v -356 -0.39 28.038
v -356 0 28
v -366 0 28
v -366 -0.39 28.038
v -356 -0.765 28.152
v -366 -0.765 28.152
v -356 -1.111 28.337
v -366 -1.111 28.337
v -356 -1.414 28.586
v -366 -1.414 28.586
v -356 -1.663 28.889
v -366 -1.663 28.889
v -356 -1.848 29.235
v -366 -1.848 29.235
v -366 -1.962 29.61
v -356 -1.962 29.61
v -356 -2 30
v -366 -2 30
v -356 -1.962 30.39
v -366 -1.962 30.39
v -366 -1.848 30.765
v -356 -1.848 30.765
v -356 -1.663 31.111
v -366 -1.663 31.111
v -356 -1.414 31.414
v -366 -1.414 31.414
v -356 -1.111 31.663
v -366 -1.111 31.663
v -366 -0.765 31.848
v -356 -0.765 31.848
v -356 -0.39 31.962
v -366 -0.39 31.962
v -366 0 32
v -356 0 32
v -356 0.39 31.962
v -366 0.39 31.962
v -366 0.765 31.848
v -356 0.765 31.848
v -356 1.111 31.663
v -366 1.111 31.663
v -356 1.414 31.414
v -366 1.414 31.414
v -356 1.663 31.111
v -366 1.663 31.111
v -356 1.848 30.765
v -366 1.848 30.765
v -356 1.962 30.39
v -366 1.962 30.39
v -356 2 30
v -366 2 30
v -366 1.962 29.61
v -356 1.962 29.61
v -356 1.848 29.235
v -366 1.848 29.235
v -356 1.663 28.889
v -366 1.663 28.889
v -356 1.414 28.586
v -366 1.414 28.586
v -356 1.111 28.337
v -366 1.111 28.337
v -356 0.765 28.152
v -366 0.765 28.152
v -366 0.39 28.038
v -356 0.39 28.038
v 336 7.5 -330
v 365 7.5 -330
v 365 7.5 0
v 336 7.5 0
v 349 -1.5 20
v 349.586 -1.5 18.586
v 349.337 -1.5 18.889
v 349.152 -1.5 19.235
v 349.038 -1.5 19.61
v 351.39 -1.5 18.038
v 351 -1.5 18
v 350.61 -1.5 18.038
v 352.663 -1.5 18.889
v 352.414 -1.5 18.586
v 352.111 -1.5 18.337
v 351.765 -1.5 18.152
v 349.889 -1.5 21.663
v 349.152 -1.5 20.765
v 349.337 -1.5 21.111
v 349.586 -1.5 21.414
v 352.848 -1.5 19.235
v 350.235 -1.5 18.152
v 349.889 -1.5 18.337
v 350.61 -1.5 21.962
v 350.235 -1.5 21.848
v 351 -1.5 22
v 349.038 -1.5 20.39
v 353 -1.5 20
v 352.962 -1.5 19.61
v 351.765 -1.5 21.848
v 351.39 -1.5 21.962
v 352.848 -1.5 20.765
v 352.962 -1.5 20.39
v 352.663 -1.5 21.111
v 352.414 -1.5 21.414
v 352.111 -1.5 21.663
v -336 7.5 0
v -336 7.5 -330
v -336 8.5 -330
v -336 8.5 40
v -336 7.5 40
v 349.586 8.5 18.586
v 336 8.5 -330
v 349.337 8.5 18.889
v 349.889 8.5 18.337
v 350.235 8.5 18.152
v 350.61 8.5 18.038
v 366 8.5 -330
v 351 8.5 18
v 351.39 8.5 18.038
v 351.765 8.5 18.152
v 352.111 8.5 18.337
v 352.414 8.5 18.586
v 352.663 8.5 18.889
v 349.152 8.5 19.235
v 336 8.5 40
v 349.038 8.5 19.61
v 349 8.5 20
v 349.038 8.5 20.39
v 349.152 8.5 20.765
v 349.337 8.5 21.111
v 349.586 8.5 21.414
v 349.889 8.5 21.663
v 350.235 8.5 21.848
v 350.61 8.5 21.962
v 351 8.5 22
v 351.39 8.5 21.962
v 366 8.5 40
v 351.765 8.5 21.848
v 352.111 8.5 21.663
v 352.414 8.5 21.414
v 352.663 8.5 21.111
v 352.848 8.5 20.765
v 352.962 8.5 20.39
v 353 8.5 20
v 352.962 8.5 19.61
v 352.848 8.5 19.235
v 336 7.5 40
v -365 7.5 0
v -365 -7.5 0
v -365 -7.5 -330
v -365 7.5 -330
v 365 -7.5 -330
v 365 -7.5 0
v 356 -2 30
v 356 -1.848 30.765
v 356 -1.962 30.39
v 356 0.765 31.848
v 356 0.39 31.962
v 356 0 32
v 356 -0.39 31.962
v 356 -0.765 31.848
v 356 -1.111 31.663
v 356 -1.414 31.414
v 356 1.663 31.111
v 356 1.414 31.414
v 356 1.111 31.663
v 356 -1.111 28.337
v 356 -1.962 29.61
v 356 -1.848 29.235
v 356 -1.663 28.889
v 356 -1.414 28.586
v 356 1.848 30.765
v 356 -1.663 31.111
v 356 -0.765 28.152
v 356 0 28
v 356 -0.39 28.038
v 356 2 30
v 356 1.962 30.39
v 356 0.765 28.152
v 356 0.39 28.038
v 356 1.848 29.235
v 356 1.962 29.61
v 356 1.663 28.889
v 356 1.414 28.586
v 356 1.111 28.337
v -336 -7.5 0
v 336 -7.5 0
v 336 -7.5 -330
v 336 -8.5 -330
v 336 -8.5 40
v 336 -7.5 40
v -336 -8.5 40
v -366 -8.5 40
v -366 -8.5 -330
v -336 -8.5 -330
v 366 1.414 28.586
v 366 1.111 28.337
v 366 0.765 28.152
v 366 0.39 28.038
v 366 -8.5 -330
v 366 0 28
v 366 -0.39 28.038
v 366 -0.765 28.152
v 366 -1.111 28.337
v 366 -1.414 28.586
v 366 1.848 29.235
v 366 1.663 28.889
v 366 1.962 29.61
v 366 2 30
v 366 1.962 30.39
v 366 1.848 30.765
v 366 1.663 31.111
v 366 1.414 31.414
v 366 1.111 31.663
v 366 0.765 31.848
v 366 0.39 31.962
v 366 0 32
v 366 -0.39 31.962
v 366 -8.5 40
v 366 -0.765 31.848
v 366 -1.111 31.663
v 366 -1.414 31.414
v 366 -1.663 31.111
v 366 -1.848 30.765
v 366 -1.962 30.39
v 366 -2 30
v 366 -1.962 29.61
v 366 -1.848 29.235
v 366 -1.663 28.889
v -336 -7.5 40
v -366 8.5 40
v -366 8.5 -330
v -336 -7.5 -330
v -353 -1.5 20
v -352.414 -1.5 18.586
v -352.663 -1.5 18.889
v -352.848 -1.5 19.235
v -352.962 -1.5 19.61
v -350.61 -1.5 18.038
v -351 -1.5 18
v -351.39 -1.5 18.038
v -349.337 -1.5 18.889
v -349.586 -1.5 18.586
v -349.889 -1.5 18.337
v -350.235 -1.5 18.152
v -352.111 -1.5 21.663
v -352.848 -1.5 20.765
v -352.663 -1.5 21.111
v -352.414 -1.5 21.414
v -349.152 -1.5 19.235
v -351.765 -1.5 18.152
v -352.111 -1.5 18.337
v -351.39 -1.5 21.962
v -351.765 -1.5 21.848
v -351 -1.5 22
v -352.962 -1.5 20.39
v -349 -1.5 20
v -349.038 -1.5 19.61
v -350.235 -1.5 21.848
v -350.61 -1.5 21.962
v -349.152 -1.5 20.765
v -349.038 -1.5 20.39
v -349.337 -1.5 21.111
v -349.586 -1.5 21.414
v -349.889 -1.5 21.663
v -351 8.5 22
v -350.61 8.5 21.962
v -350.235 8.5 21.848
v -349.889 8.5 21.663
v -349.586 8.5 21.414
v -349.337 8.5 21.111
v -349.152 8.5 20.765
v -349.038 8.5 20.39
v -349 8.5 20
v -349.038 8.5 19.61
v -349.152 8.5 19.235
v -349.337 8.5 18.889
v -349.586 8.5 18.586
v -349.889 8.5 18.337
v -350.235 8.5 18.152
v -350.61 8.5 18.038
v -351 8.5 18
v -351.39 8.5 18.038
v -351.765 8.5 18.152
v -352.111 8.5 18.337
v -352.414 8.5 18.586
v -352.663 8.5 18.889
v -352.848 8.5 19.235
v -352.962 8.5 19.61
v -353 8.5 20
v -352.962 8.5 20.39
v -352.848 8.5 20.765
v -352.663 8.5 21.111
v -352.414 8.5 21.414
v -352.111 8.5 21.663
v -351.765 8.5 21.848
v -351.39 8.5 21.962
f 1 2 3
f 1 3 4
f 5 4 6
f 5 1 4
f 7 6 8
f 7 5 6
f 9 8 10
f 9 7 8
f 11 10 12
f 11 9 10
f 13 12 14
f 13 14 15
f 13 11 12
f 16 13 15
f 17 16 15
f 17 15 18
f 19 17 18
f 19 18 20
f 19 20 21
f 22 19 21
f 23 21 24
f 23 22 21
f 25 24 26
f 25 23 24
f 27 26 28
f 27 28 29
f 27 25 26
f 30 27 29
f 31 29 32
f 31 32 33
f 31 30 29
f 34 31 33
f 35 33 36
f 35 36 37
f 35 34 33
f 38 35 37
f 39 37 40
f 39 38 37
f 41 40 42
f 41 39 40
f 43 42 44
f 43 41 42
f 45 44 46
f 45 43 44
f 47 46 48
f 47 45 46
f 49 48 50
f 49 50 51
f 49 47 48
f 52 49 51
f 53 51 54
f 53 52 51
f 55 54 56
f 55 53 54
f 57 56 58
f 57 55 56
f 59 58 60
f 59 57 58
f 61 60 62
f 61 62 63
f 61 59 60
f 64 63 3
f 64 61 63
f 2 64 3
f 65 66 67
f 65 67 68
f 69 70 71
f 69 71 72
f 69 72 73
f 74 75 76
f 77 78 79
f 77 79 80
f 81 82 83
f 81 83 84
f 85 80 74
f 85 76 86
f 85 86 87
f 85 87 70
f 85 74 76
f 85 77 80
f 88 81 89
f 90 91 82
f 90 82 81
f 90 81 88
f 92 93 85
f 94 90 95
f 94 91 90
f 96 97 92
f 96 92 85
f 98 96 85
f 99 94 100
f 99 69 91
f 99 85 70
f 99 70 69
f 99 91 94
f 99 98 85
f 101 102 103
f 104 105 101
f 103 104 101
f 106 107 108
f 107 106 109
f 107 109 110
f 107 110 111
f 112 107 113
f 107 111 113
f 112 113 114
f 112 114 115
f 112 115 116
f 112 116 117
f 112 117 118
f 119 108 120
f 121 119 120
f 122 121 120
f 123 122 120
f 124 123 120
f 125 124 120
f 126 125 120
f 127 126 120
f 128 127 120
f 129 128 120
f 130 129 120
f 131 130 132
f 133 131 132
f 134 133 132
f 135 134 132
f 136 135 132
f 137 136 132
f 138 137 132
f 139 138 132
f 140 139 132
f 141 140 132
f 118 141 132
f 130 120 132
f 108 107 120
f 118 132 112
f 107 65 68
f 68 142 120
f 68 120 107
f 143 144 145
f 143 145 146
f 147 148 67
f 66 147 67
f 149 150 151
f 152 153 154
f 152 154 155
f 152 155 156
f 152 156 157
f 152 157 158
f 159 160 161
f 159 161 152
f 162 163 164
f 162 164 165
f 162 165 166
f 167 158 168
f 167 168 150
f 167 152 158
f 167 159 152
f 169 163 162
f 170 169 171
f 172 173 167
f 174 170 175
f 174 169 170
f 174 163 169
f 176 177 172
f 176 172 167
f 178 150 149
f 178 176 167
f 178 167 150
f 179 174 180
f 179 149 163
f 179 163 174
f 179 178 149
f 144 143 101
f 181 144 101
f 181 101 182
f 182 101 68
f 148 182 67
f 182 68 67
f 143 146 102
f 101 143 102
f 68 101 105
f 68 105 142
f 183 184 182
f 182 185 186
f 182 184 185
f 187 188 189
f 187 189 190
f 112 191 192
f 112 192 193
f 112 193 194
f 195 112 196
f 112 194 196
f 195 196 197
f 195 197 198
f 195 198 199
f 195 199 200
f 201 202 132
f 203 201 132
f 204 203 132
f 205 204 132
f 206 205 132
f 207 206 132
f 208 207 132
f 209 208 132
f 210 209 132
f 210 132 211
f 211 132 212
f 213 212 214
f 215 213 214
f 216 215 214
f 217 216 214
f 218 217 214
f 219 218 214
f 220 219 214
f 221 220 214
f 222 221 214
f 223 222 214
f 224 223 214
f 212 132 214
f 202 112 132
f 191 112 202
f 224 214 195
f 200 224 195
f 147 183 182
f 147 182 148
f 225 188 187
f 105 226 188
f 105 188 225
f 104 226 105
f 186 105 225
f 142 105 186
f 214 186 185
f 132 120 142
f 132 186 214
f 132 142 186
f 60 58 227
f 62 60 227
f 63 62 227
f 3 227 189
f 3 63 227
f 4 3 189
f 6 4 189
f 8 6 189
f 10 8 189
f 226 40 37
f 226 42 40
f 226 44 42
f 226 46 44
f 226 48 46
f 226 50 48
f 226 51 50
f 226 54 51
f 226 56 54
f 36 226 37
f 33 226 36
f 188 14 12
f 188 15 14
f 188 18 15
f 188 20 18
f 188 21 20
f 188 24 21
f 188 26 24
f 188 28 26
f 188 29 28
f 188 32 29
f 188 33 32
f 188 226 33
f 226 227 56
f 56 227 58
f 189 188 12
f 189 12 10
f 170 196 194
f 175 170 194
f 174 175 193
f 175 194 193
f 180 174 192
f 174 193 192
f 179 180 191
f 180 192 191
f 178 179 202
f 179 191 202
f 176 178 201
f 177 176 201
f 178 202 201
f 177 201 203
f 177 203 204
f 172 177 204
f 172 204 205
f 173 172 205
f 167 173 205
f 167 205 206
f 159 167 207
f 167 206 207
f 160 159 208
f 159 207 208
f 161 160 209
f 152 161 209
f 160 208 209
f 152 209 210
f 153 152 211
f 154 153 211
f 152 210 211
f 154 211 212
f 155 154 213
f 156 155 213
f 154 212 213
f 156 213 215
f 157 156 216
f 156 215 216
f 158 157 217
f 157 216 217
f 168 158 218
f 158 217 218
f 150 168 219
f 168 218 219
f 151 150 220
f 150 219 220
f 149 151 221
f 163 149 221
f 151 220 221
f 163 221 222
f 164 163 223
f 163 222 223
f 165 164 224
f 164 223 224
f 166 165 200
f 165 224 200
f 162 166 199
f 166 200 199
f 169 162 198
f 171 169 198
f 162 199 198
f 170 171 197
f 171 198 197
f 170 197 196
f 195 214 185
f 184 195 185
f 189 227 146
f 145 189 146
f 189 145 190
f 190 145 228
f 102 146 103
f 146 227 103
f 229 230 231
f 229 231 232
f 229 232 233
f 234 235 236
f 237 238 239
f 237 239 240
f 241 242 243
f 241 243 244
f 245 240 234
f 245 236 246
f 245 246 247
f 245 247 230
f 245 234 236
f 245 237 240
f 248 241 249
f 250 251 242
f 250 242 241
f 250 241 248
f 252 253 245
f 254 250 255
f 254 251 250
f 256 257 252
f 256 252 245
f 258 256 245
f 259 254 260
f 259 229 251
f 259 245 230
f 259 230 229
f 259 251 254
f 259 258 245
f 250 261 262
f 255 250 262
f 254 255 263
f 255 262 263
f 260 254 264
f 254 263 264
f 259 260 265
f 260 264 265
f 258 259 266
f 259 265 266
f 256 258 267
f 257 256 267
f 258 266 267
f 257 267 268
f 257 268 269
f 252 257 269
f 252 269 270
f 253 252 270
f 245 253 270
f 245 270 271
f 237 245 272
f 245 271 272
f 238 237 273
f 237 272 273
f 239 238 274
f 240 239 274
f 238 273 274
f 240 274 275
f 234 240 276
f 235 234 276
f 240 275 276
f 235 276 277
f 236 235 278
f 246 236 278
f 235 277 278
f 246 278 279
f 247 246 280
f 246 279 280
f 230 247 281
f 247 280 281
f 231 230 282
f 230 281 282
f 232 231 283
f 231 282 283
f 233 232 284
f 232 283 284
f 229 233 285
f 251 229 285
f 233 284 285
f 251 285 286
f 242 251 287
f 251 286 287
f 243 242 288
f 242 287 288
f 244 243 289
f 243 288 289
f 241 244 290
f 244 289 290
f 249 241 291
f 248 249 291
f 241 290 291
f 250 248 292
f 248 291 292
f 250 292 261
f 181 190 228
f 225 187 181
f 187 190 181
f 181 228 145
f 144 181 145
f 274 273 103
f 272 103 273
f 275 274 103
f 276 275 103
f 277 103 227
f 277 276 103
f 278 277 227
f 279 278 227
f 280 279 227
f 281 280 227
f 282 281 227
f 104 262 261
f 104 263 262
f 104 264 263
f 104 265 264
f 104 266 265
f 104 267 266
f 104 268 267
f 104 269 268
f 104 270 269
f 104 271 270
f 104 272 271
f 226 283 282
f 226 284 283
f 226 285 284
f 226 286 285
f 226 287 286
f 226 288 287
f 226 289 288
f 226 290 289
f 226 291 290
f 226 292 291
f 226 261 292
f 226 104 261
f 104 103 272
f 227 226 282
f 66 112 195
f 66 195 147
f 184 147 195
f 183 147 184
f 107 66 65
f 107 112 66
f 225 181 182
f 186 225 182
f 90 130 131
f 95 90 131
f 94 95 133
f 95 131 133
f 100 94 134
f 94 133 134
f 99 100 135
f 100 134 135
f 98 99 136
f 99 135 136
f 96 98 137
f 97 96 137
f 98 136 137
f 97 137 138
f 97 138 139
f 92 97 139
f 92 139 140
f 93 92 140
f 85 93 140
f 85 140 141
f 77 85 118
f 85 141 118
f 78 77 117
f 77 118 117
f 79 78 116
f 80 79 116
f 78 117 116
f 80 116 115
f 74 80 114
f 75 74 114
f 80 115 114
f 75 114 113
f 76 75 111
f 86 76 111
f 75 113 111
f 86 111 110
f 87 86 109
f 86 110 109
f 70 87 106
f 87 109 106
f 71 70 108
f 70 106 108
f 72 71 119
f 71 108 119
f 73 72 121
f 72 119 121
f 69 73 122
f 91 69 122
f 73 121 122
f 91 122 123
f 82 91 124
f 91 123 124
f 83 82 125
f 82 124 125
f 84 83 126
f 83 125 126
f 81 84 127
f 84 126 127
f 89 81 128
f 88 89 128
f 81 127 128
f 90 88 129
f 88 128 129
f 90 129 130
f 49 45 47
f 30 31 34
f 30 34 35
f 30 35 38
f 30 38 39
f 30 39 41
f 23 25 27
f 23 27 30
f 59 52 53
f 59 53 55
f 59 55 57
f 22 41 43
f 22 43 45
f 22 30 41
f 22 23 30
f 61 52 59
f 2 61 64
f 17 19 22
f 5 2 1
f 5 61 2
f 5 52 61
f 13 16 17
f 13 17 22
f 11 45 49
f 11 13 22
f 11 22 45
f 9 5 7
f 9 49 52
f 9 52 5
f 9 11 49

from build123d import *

# Parameters (mm, degrees)
CROQUIS1_W              = 730
CROQUIS1_H              = 15
SALIENTE_EXTRUIR1_DEPTH = 40
SALIENTE_EXTRUIR2_DEPTH = 370
CROQUIS3_R              = 2
CORTAR_EXTRUIR1_DEPTH   = 10
CROQUIS4_R              = 2
CORTAR_EXTRUIR2_DEPTH   = 10
CORTAR_EXTRUIR3_START   = -10
CROQUIS5_R              = 2
CORTAR_EXTRUIR3_DEPTH   = 10


with BuildPart() as part:
    # Croquis1 → Saliente-Extruir1 (new body)
    with BuildSketch(Plane.XY):
        Rectangle(CROQUIS1_W, CROQUIS1_H)
    extrude(amount=SALIENTE_EXTRUIR1_DEPTH)

    # Croquis2 → Saliente-Extruir2 (add)
    with BuildSketch(Plane.XY.offset(40)):
        Polygon((-366, -8.5), (-336, -8.5), (-336, -7.5), (-365, -7.5), (-365, 7.5), (-336, 7.5), (-336, 8.5), (-366, 8.5), align=None)
        Polygon((336, 8.5), (366, 8.5), (366, -8.5), (336, -8.5), (336, -7.5), (365, -7.5), (365, 7.5), (336, 7.5), align=None)
    extrude(amount=-SALIENTE_EXTRUIR2_DEPTH)

    # Croquis3 → Cortar-Extruir1 (cut)
    with BuildSketch(Plane(origin=(0, 8.5, 0), x_dir=(1, 0, 0), z_dir=(0, 1, 0))):
        with Locations(Location((351, -20, 0), (0, 0, 270))):
            Circle(CROQUIS3_R)
        with Locations(Location((-351, -20, 0), (0, 0, 270))):
            Circle(CROQUIS3_R)
    extrude(amount=-CORTAR_EXTRUIR1_DEPTH, mode=Mode.SUBTRACT)

    # Croquis4 → Cortar-Extruir2 (cut)
    with BuildSketch(Plane(origin=(366, 0, 0), x_dir=(0, 0, -1), z_dir=(1, 0, 0))):
        with Locations((-30, 0)):
            Circle(CROQUIS4_R)
    extrude(amount=-CORTAR_EXTRUIR2_DEPTH, mode=Mode.SUBTRACT)

    # Croquis5 → Cortar-Extruir3 (cut)
    with BuildSketch(Plane.ZY.offset(366).offset(CORTAR_EXTRUIR3_START)):
        with Locations(Location((30, 0, 0), (0, 0, 180))):
            Circle(CROQUIS5_R)
    extrude(amount=CORTAR_EXTRUIR3_DEPTH, mode=Mode.SUBTRACT)


solid = part.part
